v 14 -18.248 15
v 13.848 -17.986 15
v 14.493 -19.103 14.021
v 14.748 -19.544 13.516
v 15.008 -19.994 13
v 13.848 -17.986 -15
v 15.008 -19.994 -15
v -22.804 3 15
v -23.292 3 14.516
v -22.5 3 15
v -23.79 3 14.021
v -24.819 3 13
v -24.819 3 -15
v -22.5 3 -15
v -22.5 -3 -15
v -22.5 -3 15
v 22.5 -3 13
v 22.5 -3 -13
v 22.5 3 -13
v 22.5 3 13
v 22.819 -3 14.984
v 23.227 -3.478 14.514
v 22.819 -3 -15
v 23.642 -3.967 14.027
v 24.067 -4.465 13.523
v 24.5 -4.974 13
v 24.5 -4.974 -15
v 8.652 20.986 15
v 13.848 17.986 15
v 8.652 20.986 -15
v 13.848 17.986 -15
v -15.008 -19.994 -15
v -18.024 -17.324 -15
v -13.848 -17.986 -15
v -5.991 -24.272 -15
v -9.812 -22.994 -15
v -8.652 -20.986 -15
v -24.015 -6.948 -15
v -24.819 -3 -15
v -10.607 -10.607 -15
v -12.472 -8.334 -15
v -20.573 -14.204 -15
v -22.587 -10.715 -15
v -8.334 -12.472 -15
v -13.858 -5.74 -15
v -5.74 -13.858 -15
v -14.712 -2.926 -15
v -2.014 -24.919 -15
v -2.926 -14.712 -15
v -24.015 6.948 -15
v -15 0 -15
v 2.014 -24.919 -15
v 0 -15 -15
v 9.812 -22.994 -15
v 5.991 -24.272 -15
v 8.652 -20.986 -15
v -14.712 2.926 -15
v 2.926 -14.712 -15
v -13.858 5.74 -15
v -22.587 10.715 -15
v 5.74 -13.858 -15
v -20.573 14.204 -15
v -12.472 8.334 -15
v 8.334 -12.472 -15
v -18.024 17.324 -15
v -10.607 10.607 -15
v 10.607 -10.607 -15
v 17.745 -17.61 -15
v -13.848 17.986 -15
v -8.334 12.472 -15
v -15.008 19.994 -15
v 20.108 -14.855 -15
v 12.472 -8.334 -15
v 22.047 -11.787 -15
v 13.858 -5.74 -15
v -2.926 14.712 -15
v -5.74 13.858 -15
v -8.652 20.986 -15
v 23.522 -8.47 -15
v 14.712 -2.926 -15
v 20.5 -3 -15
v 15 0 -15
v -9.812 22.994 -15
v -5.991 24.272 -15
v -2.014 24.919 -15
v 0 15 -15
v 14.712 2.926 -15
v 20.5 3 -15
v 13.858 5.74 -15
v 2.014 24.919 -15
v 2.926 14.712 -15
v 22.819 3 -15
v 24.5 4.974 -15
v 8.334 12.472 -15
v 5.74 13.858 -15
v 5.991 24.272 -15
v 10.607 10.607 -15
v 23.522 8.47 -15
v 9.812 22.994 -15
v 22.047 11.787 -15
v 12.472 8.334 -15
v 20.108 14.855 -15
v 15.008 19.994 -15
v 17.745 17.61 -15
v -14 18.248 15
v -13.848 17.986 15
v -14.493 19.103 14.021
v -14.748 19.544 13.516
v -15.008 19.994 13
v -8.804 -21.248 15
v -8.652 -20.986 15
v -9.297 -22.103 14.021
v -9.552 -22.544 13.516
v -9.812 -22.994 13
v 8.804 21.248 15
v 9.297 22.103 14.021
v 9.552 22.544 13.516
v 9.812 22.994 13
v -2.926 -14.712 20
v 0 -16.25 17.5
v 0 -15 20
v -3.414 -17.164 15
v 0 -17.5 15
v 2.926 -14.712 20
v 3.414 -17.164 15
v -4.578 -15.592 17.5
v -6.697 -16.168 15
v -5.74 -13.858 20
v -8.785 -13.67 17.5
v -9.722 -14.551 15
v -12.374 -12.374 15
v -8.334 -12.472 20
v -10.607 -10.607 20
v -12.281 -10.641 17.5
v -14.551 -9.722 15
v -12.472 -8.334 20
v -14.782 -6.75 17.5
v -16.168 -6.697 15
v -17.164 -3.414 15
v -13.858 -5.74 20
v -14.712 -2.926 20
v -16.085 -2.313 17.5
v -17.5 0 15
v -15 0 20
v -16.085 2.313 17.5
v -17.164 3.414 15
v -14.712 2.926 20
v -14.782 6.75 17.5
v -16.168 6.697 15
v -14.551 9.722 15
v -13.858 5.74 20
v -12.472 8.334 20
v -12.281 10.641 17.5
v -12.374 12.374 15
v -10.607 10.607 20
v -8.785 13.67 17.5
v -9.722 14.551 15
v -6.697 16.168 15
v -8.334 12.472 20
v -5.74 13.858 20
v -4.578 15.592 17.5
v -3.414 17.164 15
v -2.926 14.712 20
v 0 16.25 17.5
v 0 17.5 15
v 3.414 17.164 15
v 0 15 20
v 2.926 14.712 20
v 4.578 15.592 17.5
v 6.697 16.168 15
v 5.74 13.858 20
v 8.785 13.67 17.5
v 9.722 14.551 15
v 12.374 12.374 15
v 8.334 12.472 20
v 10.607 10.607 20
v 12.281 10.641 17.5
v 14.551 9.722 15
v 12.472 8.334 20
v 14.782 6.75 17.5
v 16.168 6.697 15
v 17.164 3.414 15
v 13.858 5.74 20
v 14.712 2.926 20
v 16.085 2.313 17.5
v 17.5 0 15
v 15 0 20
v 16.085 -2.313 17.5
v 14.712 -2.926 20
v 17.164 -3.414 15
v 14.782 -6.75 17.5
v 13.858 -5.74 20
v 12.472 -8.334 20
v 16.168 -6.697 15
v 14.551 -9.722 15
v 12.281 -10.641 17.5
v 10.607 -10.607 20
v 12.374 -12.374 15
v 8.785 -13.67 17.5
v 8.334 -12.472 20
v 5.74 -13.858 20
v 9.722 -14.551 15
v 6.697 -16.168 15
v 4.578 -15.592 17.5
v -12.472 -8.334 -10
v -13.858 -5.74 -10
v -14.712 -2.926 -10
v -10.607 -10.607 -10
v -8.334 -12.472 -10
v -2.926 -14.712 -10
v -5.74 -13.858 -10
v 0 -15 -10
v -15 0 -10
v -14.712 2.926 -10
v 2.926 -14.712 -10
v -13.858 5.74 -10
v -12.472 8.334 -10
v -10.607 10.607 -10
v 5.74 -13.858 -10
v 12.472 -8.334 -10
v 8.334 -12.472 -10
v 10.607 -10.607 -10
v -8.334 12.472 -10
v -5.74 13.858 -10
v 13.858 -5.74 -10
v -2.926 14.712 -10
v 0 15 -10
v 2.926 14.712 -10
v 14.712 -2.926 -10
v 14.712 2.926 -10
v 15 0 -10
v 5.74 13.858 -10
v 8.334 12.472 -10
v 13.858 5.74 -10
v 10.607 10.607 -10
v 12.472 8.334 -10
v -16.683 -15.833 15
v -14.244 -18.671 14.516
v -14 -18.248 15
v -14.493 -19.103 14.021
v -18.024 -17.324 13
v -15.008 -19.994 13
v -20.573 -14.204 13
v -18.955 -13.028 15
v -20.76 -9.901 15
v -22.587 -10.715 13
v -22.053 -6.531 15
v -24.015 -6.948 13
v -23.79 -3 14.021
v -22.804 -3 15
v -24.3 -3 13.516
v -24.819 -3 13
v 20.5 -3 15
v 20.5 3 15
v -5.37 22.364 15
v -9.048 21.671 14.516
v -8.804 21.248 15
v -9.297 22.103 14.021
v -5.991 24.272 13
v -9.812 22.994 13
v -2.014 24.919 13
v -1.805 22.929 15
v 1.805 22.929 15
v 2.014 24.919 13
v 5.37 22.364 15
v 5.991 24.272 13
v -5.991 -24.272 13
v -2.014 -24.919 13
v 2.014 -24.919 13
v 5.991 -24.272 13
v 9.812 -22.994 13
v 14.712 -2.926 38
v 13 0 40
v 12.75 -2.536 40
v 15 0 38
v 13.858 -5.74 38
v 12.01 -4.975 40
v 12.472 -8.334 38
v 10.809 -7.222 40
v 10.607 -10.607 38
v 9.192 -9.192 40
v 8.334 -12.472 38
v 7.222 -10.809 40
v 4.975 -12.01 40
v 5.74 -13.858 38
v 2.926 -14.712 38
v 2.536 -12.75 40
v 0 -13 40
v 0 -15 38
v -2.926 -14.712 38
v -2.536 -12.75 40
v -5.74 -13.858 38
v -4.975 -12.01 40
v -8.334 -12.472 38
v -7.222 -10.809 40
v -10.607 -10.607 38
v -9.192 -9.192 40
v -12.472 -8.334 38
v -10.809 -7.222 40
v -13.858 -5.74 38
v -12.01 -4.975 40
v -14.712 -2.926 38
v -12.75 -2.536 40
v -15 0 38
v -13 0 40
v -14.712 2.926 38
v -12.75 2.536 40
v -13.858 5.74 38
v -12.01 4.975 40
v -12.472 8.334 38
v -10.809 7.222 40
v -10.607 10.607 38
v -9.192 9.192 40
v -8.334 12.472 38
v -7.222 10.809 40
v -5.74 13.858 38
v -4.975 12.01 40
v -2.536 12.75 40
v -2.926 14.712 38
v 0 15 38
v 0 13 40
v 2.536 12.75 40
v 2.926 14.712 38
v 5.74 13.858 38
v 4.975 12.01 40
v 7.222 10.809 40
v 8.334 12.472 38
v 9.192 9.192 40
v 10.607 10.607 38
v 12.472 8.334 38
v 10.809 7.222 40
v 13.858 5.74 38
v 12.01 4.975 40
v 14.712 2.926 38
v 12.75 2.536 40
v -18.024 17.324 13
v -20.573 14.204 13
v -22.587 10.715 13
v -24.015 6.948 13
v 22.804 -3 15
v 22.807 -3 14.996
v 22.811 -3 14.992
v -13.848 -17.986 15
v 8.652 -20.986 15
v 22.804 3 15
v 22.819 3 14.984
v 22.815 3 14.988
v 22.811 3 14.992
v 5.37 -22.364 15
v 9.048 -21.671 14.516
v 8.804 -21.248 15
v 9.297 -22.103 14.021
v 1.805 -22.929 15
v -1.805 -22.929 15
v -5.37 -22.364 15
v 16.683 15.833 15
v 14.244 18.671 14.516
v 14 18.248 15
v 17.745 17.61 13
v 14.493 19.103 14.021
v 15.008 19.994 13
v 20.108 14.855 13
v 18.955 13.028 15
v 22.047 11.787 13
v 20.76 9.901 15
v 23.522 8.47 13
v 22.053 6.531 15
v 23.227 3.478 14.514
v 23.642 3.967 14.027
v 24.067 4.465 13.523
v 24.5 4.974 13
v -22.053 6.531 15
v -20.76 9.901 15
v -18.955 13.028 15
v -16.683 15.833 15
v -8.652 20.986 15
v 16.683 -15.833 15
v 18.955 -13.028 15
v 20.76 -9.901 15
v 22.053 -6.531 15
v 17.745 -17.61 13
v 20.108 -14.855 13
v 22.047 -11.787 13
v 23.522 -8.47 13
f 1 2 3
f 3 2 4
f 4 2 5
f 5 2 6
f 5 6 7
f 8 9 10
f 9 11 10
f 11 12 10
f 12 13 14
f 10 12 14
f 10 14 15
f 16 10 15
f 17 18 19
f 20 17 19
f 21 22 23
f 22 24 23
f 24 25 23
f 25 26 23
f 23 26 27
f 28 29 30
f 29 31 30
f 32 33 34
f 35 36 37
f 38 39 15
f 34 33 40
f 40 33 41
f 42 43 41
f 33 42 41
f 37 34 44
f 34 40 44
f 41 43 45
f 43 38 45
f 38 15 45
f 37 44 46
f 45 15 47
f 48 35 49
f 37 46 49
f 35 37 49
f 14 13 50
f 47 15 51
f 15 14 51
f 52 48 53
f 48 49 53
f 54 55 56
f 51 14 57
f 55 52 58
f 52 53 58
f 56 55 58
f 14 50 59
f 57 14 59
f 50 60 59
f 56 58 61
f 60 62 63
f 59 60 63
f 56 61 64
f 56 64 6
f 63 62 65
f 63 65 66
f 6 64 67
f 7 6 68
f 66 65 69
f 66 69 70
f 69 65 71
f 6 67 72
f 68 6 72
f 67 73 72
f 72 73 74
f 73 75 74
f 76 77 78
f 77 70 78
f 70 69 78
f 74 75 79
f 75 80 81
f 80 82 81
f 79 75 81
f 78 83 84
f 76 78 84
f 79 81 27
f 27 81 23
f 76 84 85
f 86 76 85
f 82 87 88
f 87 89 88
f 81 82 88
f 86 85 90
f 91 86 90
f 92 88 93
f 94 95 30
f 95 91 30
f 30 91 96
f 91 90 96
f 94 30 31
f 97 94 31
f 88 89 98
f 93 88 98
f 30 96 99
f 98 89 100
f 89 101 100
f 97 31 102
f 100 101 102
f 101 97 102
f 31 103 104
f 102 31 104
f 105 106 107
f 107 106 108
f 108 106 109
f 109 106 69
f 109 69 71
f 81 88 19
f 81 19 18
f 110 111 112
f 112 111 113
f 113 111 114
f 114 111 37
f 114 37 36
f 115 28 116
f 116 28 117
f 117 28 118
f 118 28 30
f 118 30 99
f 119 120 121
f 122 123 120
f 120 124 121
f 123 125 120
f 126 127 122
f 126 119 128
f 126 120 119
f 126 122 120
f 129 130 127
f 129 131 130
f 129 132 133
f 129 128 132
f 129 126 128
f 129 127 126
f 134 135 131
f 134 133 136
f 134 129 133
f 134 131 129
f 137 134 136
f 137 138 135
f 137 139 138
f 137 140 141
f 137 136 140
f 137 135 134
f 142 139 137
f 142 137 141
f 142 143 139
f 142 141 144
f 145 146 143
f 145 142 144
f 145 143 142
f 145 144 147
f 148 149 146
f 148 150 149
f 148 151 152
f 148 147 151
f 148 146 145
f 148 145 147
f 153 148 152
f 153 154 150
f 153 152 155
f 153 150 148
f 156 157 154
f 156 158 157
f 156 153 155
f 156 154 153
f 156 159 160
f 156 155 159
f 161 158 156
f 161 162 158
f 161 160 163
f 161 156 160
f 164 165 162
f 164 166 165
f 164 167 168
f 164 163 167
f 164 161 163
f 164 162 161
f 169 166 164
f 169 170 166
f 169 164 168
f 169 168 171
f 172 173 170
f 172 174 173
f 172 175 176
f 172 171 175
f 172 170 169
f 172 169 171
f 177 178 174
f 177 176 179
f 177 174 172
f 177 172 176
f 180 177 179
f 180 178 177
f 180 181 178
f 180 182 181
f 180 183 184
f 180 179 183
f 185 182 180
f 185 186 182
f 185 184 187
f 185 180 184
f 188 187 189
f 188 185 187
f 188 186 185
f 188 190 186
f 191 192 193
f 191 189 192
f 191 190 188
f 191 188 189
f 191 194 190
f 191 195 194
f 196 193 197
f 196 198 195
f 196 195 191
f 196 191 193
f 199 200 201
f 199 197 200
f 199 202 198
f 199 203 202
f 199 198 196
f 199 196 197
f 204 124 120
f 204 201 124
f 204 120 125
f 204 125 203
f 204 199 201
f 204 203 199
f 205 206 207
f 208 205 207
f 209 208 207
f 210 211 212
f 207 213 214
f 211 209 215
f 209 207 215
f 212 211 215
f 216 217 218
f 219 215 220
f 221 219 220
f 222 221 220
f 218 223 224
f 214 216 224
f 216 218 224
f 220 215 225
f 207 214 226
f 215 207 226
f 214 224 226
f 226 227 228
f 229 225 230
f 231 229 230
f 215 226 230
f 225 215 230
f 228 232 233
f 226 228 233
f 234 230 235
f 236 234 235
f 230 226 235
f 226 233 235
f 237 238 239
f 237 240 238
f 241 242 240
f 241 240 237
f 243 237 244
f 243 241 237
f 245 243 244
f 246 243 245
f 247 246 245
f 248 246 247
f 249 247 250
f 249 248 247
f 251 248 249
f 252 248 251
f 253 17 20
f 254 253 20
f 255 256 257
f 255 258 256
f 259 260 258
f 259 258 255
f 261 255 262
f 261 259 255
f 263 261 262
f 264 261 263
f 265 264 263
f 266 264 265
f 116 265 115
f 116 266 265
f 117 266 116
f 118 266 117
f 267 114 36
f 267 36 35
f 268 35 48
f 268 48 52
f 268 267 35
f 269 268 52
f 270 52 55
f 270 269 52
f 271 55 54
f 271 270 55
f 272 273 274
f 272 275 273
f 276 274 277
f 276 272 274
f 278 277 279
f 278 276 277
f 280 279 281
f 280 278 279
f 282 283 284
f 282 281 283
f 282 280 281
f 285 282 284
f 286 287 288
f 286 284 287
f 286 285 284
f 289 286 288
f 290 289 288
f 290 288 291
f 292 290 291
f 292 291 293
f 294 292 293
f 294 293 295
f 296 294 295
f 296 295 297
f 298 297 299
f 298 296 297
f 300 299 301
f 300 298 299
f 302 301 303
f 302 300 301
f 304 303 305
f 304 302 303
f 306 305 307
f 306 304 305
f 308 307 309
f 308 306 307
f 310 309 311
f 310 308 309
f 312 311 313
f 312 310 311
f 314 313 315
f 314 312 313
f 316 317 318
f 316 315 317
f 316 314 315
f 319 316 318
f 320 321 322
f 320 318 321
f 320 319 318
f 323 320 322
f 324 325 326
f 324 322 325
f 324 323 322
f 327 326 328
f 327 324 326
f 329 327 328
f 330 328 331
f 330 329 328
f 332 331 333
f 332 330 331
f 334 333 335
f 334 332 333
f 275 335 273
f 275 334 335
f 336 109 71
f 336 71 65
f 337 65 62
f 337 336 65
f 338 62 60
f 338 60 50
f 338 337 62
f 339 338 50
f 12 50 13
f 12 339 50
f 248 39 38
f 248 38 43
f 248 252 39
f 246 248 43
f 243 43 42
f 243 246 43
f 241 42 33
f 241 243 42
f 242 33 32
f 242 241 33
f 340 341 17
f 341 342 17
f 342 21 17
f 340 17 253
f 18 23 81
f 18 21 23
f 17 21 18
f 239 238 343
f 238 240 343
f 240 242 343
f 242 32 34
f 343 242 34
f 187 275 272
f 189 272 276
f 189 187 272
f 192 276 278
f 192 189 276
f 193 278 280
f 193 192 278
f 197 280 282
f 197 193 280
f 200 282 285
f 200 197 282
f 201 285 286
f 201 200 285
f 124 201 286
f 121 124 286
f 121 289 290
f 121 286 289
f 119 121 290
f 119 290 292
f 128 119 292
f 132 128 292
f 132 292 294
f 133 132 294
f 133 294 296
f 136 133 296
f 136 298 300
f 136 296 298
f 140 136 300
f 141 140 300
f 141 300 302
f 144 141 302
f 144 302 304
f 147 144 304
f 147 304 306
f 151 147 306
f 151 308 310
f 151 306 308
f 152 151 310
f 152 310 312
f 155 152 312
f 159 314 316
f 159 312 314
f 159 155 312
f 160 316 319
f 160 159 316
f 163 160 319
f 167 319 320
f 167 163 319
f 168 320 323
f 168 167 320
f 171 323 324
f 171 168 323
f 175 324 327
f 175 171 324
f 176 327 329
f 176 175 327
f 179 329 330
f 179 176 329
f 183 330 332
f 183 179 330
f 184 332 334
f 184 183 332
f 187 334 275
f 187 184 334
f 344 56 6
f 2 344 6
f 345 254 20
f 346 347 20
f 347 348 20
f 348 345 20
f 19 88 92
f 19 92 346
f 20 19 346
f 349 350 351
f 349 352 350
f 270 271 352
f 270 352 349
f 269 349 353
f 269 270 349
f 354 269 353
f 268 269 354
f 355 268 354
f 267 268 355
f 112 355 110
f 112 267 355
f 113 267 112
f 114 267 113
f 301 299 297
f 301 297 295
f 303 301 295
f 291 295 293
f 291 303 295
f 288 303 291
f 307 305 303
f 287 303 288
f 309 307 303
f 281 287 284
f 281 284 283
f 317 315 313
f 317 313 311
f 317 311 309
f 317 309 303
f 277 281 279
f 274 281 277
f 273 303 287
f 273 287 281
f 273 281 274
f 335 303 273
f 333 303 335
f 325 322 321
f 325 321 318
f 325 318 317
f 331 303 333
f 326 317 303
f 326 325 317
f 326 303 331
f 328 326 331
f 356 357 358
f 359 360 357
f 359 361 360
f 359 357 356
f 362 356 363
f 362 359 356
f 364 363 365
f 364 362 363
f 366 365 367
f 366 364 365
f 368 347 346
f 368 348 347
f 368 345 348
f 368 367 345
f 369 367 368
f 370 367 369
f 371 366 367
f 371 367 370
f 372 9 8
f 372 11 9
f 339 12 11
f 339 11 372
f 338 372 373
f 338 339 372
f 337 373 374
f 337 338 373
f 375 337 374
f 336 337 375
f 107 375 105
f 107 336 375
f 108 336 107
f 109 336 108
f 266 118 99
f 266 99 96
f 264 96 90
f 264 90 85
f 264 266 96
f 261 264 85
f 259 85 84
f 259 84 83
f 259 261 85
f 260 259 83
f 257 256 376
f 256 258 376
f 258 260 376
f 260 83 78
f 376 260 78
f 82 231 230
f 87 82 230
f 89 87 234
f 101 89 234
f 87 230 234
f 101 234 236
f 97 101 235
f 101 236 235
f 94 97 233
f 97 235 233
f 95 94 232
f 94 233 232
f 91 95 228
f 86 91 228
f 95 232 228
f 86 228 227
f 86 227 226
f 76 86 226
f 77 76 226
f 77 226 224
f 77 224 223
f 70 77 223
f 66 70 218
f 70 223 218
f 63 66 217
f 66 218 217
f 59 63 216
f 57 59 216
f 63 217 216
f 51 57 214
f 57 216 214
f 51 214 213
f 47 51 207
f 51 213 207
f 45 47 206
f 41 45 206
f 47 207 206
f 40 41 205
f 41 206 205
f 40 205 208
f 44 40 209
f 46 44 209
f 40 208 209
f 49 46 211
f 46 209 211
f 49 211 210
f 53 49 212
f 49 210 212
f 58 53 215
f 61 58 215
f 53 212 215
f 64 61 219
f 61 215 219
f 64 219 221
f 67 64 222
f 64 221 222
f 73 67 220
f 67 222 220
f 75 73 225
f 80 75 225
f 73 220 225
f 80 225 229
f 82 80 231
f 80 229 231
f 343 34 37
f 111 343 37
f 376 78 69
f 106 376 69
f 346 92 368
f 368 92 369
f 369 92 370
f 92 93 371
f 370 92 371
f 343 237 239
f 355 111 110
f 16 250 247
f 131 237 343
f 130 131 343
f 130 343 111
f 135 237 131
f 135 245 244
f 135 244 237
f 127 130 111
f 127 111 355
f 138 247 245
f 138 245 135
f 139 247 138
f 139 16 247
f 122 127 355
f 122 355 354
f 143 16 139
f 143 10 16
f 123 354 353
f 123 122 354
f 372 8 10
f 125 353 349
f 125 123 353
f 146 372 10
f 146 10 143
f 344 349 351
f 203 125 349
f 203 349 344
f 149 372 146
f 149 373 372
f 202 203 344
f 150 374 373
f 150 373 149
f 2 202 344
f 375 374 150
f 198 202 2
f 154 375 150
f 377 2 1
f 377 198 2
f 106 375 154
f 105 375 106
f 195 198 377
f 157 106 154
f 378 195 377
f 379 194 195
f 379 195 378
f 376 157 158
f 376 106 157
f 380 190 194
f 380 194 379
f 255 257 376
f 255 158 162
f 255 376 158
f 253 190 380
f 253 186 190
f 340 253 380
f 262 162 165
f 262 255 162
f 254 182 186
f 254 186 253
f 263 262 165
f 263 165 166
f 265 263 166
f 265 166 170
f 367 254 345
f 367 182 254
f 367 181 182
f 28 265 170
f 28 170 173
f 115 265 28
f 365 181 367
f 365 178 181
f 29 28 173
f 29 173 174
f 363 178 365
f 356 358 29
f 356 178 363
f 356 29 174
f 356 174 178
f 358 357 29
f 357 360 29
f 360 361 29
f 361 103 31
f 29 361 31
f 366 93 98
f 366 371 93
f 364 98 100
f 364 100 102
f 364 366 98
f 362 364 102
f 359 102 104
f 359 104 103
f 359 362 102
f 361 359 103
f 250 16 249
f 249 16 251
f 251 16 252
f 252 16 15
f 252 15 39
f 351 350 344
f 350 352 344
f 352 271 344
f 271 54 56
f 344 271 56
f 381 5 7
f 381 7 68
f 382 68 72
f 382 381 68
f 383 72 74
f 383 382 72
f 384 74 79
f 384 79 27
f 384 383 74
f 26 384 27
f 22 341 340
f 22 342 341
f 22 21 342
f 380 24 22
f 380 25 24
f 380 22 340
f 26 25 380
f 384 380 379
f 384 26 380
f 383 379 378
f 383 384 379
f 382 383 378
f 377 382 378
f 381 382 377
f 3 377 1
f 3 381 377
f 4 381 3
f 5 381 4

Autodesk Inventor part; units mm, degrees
ref_plane "YZ Plane" through (0, 0, 0) normal (1, 0, 0) x (0, 1, 0)
ref_plane "XZ Plane" through (0, 0, 0) normal (0, 1, 0) x (-1, 0, 0)
ref_plane "XY Plane" through (0, 0, 0) normal (0, 0, 1) x (1, 0, 0)
sketch "Sketch1" plane through (0, 0, 0) normal (0, 0, 1) x (1, 0, 0)
  circle A0 centre (0, 0) radius 15
  circle A1 centre (0, 0) radius 25
  dimension "d0" = 30
extrude "Extrusion1" add sketch "Sketch1" along normal mid plane 30
extrude "Extrusion2" add sketch "Sketch1" against normal blind 10 contours A0
extrude "Extrusion3" add sketch "Sketch1" along normal blind 40 contours A0
chamfer "Chamfer1" distance 2 angle 45 1 edges at (-25, 0, 15)
sketch "Sketch2" plane through (0, 0, -15) normal (0, 0, -1) x (-1, 0, 0)
  circle A0 centre (0, 0) radius 25 projected
  circle A1 centre (0, 0) radius 15 projected
  line L0 (-22.5, 3) -> (-25.5, 3)
  line L1 (-25.5, 3) -> (-25.5, -3)
  line L2 (-25.5, -3) -> (-22.5, -3)
  line L3 (-22.5, -3) -> (-22.5, 3)
  line L4 (-22.5, 3) -> (-25.5, -3) construction
  line L5 (-25.5, 3) -> (-22.5, -3) construction
  point P0 (-24, 0)
  dimension "d12" = 6
  dimension "d13" = 24
  dimension "d14" = 3
extrude "Extrusion4" cut sketch "Sketch2" against normal through all contours L0 L3 L2 A0 | A0 L2 L1 L0 picked at (-23.3266, 0.334)
chamfer "Chamfer2" distance 2 angle 45 5 edges at (24.8193, -3, -1) (24.8193, 3, -1) (22.5, 0, -15) (22.5, 0, 15) (-15, 0, 40)
pattern_circular "Circular Pattern1" count 6 over 360 about axis through (0, 0, -10) along (0, 0, 1) of "Extrusion4"
sketch "Sketch3" plane through (0, 0, 15) normal (0, 0, 1) x (1, 0, 0)
  circle A0 centre (0, 0) radius 15 projected
  line L0 (20.5, 3) -> (20.5, -3) projected
  line L1 (20.5, -3) -> (22.8035, -3) projected
  arc A1 (13.9998, -18.2484) -> (22.8035, -3) centre (0, 0) ccw projected
  line L2 (13.9998, -18.2484) -> (13.8481, -17.9856) projected
  line L3 (13.8481, -17.9856) -> (8.6519, -20.9856) projected
  line L4 (8.6519, -20.9856) -> (8.8037, -21.2484) projected
  arc A2 (-8.8037, -21.2484) -> (8.8037, -21.2484) centre (0, 0) ccw projected
  line L5 (-8.8037, -21.2484) -> (-8.6519, -20.9856) projected
  line L6 (-8.6519, -20.9856) -> (-13.8481, -17.9856) projected
  line L7 (-13.8481, -17.9856) -> (-13.9998, -18.2484) projected
  arc A3 (-22.8035, -3) -> (-13.9998, -18.2484) centre (0, 0) ccw projected
  line L8 (-22.8035, -3) -> (-22.5, -3) projected
  line L9 (-22.5, -3) -> (-22.5, 3) projected
  line L10 (-22.5, 3) -> (-22.8035, 3) projected
  arc A4 (-13.9998, 18.2484) -> (-22.8035, 3) centre (0, 0) ccw projected
  line L11 (-13.9998, 18.2484) -> (-13.8481, 17.9856) projected
  line L12 (-13.8481, 17.9856) -> (-8.6519, 20.9856) projected
  line L13 (-8.6519, 20.9856) -> (-8.8037, 21.2484) projected
  arc A5 (8.8037, 21.2484) -> (-8.8037, 21.2484) centre (0, 0) ccw projected
  line L14 (8.8037, 21.2484) -> (8.6519, 20.9856) projected
  line L15 (8.6519, 20.9856) -> (13.8481, 17.9856) projected
  line L16 (13.8481, 17.9856) -> (13.9998, 18.2484) projected
  arc A6 (22.8035, 3) -> (13.9998, 18.2484) centre (0, 0) ccw projected
  line L17 (22.8035, 3) -> (20.5, 3) projected
  circle A7 centre (0, 0) radius 17.5
  dimension "d21" = 35
extrude "Extrusion5" add sketch "Sketch3" along normal blind 5 contours A7
sketch "Sketch4" plane through (0, 0, 0) normal (1, 0, 0) x (0, 1, 0)
  line L0 (15, 20) -> (-15, 20) projected
  line L1 (15, 38) -> (-15, 38) projected
  line L2 (17.5, 20) -> (-17.5, 20) projected
  line L3 (-17.5, 15) -> (17.5, 15) projected
  line L4 (-19.9942, 13) -> (-19.9942, -15) projected
  line L5 (-4.9744, -15) -> (-19.9942, -15) projected
  line L6 (-4.9744, 13) -> (-4.9744, -15) projected
  line L7 (-19.9942, 13) -> (-4.9744, 13) projected
  line L8 (-15, 20) -> (-17.5, 15)
  line L9 (-18.2484, 15) -> (-3, 15) projected
  line L10 (-15, 15) -> (-15, 20)
  line L11 (-17.5, 15) -> (-15, 15)
  line L12 (-15, 20) -> (-17.5, 20)
  line L13 (-17.5, 20) -> (-17.5, 15)
  line L14 (-17.5, 15) -> (-15, 15)
  line L15 (-15, 15) -> (-15, 20)
  line L16 (0, -26) -> (0, 51) projected
  point P0 (0, 0)
revolve "Revolution1" cut sketch "Sketch4" angle 360 about axis through (0, 0, -10) along (0, 0, 1) contours L8 L13 L2
properties part number "base_hydraulic_pump" material "Stainless Steel"
